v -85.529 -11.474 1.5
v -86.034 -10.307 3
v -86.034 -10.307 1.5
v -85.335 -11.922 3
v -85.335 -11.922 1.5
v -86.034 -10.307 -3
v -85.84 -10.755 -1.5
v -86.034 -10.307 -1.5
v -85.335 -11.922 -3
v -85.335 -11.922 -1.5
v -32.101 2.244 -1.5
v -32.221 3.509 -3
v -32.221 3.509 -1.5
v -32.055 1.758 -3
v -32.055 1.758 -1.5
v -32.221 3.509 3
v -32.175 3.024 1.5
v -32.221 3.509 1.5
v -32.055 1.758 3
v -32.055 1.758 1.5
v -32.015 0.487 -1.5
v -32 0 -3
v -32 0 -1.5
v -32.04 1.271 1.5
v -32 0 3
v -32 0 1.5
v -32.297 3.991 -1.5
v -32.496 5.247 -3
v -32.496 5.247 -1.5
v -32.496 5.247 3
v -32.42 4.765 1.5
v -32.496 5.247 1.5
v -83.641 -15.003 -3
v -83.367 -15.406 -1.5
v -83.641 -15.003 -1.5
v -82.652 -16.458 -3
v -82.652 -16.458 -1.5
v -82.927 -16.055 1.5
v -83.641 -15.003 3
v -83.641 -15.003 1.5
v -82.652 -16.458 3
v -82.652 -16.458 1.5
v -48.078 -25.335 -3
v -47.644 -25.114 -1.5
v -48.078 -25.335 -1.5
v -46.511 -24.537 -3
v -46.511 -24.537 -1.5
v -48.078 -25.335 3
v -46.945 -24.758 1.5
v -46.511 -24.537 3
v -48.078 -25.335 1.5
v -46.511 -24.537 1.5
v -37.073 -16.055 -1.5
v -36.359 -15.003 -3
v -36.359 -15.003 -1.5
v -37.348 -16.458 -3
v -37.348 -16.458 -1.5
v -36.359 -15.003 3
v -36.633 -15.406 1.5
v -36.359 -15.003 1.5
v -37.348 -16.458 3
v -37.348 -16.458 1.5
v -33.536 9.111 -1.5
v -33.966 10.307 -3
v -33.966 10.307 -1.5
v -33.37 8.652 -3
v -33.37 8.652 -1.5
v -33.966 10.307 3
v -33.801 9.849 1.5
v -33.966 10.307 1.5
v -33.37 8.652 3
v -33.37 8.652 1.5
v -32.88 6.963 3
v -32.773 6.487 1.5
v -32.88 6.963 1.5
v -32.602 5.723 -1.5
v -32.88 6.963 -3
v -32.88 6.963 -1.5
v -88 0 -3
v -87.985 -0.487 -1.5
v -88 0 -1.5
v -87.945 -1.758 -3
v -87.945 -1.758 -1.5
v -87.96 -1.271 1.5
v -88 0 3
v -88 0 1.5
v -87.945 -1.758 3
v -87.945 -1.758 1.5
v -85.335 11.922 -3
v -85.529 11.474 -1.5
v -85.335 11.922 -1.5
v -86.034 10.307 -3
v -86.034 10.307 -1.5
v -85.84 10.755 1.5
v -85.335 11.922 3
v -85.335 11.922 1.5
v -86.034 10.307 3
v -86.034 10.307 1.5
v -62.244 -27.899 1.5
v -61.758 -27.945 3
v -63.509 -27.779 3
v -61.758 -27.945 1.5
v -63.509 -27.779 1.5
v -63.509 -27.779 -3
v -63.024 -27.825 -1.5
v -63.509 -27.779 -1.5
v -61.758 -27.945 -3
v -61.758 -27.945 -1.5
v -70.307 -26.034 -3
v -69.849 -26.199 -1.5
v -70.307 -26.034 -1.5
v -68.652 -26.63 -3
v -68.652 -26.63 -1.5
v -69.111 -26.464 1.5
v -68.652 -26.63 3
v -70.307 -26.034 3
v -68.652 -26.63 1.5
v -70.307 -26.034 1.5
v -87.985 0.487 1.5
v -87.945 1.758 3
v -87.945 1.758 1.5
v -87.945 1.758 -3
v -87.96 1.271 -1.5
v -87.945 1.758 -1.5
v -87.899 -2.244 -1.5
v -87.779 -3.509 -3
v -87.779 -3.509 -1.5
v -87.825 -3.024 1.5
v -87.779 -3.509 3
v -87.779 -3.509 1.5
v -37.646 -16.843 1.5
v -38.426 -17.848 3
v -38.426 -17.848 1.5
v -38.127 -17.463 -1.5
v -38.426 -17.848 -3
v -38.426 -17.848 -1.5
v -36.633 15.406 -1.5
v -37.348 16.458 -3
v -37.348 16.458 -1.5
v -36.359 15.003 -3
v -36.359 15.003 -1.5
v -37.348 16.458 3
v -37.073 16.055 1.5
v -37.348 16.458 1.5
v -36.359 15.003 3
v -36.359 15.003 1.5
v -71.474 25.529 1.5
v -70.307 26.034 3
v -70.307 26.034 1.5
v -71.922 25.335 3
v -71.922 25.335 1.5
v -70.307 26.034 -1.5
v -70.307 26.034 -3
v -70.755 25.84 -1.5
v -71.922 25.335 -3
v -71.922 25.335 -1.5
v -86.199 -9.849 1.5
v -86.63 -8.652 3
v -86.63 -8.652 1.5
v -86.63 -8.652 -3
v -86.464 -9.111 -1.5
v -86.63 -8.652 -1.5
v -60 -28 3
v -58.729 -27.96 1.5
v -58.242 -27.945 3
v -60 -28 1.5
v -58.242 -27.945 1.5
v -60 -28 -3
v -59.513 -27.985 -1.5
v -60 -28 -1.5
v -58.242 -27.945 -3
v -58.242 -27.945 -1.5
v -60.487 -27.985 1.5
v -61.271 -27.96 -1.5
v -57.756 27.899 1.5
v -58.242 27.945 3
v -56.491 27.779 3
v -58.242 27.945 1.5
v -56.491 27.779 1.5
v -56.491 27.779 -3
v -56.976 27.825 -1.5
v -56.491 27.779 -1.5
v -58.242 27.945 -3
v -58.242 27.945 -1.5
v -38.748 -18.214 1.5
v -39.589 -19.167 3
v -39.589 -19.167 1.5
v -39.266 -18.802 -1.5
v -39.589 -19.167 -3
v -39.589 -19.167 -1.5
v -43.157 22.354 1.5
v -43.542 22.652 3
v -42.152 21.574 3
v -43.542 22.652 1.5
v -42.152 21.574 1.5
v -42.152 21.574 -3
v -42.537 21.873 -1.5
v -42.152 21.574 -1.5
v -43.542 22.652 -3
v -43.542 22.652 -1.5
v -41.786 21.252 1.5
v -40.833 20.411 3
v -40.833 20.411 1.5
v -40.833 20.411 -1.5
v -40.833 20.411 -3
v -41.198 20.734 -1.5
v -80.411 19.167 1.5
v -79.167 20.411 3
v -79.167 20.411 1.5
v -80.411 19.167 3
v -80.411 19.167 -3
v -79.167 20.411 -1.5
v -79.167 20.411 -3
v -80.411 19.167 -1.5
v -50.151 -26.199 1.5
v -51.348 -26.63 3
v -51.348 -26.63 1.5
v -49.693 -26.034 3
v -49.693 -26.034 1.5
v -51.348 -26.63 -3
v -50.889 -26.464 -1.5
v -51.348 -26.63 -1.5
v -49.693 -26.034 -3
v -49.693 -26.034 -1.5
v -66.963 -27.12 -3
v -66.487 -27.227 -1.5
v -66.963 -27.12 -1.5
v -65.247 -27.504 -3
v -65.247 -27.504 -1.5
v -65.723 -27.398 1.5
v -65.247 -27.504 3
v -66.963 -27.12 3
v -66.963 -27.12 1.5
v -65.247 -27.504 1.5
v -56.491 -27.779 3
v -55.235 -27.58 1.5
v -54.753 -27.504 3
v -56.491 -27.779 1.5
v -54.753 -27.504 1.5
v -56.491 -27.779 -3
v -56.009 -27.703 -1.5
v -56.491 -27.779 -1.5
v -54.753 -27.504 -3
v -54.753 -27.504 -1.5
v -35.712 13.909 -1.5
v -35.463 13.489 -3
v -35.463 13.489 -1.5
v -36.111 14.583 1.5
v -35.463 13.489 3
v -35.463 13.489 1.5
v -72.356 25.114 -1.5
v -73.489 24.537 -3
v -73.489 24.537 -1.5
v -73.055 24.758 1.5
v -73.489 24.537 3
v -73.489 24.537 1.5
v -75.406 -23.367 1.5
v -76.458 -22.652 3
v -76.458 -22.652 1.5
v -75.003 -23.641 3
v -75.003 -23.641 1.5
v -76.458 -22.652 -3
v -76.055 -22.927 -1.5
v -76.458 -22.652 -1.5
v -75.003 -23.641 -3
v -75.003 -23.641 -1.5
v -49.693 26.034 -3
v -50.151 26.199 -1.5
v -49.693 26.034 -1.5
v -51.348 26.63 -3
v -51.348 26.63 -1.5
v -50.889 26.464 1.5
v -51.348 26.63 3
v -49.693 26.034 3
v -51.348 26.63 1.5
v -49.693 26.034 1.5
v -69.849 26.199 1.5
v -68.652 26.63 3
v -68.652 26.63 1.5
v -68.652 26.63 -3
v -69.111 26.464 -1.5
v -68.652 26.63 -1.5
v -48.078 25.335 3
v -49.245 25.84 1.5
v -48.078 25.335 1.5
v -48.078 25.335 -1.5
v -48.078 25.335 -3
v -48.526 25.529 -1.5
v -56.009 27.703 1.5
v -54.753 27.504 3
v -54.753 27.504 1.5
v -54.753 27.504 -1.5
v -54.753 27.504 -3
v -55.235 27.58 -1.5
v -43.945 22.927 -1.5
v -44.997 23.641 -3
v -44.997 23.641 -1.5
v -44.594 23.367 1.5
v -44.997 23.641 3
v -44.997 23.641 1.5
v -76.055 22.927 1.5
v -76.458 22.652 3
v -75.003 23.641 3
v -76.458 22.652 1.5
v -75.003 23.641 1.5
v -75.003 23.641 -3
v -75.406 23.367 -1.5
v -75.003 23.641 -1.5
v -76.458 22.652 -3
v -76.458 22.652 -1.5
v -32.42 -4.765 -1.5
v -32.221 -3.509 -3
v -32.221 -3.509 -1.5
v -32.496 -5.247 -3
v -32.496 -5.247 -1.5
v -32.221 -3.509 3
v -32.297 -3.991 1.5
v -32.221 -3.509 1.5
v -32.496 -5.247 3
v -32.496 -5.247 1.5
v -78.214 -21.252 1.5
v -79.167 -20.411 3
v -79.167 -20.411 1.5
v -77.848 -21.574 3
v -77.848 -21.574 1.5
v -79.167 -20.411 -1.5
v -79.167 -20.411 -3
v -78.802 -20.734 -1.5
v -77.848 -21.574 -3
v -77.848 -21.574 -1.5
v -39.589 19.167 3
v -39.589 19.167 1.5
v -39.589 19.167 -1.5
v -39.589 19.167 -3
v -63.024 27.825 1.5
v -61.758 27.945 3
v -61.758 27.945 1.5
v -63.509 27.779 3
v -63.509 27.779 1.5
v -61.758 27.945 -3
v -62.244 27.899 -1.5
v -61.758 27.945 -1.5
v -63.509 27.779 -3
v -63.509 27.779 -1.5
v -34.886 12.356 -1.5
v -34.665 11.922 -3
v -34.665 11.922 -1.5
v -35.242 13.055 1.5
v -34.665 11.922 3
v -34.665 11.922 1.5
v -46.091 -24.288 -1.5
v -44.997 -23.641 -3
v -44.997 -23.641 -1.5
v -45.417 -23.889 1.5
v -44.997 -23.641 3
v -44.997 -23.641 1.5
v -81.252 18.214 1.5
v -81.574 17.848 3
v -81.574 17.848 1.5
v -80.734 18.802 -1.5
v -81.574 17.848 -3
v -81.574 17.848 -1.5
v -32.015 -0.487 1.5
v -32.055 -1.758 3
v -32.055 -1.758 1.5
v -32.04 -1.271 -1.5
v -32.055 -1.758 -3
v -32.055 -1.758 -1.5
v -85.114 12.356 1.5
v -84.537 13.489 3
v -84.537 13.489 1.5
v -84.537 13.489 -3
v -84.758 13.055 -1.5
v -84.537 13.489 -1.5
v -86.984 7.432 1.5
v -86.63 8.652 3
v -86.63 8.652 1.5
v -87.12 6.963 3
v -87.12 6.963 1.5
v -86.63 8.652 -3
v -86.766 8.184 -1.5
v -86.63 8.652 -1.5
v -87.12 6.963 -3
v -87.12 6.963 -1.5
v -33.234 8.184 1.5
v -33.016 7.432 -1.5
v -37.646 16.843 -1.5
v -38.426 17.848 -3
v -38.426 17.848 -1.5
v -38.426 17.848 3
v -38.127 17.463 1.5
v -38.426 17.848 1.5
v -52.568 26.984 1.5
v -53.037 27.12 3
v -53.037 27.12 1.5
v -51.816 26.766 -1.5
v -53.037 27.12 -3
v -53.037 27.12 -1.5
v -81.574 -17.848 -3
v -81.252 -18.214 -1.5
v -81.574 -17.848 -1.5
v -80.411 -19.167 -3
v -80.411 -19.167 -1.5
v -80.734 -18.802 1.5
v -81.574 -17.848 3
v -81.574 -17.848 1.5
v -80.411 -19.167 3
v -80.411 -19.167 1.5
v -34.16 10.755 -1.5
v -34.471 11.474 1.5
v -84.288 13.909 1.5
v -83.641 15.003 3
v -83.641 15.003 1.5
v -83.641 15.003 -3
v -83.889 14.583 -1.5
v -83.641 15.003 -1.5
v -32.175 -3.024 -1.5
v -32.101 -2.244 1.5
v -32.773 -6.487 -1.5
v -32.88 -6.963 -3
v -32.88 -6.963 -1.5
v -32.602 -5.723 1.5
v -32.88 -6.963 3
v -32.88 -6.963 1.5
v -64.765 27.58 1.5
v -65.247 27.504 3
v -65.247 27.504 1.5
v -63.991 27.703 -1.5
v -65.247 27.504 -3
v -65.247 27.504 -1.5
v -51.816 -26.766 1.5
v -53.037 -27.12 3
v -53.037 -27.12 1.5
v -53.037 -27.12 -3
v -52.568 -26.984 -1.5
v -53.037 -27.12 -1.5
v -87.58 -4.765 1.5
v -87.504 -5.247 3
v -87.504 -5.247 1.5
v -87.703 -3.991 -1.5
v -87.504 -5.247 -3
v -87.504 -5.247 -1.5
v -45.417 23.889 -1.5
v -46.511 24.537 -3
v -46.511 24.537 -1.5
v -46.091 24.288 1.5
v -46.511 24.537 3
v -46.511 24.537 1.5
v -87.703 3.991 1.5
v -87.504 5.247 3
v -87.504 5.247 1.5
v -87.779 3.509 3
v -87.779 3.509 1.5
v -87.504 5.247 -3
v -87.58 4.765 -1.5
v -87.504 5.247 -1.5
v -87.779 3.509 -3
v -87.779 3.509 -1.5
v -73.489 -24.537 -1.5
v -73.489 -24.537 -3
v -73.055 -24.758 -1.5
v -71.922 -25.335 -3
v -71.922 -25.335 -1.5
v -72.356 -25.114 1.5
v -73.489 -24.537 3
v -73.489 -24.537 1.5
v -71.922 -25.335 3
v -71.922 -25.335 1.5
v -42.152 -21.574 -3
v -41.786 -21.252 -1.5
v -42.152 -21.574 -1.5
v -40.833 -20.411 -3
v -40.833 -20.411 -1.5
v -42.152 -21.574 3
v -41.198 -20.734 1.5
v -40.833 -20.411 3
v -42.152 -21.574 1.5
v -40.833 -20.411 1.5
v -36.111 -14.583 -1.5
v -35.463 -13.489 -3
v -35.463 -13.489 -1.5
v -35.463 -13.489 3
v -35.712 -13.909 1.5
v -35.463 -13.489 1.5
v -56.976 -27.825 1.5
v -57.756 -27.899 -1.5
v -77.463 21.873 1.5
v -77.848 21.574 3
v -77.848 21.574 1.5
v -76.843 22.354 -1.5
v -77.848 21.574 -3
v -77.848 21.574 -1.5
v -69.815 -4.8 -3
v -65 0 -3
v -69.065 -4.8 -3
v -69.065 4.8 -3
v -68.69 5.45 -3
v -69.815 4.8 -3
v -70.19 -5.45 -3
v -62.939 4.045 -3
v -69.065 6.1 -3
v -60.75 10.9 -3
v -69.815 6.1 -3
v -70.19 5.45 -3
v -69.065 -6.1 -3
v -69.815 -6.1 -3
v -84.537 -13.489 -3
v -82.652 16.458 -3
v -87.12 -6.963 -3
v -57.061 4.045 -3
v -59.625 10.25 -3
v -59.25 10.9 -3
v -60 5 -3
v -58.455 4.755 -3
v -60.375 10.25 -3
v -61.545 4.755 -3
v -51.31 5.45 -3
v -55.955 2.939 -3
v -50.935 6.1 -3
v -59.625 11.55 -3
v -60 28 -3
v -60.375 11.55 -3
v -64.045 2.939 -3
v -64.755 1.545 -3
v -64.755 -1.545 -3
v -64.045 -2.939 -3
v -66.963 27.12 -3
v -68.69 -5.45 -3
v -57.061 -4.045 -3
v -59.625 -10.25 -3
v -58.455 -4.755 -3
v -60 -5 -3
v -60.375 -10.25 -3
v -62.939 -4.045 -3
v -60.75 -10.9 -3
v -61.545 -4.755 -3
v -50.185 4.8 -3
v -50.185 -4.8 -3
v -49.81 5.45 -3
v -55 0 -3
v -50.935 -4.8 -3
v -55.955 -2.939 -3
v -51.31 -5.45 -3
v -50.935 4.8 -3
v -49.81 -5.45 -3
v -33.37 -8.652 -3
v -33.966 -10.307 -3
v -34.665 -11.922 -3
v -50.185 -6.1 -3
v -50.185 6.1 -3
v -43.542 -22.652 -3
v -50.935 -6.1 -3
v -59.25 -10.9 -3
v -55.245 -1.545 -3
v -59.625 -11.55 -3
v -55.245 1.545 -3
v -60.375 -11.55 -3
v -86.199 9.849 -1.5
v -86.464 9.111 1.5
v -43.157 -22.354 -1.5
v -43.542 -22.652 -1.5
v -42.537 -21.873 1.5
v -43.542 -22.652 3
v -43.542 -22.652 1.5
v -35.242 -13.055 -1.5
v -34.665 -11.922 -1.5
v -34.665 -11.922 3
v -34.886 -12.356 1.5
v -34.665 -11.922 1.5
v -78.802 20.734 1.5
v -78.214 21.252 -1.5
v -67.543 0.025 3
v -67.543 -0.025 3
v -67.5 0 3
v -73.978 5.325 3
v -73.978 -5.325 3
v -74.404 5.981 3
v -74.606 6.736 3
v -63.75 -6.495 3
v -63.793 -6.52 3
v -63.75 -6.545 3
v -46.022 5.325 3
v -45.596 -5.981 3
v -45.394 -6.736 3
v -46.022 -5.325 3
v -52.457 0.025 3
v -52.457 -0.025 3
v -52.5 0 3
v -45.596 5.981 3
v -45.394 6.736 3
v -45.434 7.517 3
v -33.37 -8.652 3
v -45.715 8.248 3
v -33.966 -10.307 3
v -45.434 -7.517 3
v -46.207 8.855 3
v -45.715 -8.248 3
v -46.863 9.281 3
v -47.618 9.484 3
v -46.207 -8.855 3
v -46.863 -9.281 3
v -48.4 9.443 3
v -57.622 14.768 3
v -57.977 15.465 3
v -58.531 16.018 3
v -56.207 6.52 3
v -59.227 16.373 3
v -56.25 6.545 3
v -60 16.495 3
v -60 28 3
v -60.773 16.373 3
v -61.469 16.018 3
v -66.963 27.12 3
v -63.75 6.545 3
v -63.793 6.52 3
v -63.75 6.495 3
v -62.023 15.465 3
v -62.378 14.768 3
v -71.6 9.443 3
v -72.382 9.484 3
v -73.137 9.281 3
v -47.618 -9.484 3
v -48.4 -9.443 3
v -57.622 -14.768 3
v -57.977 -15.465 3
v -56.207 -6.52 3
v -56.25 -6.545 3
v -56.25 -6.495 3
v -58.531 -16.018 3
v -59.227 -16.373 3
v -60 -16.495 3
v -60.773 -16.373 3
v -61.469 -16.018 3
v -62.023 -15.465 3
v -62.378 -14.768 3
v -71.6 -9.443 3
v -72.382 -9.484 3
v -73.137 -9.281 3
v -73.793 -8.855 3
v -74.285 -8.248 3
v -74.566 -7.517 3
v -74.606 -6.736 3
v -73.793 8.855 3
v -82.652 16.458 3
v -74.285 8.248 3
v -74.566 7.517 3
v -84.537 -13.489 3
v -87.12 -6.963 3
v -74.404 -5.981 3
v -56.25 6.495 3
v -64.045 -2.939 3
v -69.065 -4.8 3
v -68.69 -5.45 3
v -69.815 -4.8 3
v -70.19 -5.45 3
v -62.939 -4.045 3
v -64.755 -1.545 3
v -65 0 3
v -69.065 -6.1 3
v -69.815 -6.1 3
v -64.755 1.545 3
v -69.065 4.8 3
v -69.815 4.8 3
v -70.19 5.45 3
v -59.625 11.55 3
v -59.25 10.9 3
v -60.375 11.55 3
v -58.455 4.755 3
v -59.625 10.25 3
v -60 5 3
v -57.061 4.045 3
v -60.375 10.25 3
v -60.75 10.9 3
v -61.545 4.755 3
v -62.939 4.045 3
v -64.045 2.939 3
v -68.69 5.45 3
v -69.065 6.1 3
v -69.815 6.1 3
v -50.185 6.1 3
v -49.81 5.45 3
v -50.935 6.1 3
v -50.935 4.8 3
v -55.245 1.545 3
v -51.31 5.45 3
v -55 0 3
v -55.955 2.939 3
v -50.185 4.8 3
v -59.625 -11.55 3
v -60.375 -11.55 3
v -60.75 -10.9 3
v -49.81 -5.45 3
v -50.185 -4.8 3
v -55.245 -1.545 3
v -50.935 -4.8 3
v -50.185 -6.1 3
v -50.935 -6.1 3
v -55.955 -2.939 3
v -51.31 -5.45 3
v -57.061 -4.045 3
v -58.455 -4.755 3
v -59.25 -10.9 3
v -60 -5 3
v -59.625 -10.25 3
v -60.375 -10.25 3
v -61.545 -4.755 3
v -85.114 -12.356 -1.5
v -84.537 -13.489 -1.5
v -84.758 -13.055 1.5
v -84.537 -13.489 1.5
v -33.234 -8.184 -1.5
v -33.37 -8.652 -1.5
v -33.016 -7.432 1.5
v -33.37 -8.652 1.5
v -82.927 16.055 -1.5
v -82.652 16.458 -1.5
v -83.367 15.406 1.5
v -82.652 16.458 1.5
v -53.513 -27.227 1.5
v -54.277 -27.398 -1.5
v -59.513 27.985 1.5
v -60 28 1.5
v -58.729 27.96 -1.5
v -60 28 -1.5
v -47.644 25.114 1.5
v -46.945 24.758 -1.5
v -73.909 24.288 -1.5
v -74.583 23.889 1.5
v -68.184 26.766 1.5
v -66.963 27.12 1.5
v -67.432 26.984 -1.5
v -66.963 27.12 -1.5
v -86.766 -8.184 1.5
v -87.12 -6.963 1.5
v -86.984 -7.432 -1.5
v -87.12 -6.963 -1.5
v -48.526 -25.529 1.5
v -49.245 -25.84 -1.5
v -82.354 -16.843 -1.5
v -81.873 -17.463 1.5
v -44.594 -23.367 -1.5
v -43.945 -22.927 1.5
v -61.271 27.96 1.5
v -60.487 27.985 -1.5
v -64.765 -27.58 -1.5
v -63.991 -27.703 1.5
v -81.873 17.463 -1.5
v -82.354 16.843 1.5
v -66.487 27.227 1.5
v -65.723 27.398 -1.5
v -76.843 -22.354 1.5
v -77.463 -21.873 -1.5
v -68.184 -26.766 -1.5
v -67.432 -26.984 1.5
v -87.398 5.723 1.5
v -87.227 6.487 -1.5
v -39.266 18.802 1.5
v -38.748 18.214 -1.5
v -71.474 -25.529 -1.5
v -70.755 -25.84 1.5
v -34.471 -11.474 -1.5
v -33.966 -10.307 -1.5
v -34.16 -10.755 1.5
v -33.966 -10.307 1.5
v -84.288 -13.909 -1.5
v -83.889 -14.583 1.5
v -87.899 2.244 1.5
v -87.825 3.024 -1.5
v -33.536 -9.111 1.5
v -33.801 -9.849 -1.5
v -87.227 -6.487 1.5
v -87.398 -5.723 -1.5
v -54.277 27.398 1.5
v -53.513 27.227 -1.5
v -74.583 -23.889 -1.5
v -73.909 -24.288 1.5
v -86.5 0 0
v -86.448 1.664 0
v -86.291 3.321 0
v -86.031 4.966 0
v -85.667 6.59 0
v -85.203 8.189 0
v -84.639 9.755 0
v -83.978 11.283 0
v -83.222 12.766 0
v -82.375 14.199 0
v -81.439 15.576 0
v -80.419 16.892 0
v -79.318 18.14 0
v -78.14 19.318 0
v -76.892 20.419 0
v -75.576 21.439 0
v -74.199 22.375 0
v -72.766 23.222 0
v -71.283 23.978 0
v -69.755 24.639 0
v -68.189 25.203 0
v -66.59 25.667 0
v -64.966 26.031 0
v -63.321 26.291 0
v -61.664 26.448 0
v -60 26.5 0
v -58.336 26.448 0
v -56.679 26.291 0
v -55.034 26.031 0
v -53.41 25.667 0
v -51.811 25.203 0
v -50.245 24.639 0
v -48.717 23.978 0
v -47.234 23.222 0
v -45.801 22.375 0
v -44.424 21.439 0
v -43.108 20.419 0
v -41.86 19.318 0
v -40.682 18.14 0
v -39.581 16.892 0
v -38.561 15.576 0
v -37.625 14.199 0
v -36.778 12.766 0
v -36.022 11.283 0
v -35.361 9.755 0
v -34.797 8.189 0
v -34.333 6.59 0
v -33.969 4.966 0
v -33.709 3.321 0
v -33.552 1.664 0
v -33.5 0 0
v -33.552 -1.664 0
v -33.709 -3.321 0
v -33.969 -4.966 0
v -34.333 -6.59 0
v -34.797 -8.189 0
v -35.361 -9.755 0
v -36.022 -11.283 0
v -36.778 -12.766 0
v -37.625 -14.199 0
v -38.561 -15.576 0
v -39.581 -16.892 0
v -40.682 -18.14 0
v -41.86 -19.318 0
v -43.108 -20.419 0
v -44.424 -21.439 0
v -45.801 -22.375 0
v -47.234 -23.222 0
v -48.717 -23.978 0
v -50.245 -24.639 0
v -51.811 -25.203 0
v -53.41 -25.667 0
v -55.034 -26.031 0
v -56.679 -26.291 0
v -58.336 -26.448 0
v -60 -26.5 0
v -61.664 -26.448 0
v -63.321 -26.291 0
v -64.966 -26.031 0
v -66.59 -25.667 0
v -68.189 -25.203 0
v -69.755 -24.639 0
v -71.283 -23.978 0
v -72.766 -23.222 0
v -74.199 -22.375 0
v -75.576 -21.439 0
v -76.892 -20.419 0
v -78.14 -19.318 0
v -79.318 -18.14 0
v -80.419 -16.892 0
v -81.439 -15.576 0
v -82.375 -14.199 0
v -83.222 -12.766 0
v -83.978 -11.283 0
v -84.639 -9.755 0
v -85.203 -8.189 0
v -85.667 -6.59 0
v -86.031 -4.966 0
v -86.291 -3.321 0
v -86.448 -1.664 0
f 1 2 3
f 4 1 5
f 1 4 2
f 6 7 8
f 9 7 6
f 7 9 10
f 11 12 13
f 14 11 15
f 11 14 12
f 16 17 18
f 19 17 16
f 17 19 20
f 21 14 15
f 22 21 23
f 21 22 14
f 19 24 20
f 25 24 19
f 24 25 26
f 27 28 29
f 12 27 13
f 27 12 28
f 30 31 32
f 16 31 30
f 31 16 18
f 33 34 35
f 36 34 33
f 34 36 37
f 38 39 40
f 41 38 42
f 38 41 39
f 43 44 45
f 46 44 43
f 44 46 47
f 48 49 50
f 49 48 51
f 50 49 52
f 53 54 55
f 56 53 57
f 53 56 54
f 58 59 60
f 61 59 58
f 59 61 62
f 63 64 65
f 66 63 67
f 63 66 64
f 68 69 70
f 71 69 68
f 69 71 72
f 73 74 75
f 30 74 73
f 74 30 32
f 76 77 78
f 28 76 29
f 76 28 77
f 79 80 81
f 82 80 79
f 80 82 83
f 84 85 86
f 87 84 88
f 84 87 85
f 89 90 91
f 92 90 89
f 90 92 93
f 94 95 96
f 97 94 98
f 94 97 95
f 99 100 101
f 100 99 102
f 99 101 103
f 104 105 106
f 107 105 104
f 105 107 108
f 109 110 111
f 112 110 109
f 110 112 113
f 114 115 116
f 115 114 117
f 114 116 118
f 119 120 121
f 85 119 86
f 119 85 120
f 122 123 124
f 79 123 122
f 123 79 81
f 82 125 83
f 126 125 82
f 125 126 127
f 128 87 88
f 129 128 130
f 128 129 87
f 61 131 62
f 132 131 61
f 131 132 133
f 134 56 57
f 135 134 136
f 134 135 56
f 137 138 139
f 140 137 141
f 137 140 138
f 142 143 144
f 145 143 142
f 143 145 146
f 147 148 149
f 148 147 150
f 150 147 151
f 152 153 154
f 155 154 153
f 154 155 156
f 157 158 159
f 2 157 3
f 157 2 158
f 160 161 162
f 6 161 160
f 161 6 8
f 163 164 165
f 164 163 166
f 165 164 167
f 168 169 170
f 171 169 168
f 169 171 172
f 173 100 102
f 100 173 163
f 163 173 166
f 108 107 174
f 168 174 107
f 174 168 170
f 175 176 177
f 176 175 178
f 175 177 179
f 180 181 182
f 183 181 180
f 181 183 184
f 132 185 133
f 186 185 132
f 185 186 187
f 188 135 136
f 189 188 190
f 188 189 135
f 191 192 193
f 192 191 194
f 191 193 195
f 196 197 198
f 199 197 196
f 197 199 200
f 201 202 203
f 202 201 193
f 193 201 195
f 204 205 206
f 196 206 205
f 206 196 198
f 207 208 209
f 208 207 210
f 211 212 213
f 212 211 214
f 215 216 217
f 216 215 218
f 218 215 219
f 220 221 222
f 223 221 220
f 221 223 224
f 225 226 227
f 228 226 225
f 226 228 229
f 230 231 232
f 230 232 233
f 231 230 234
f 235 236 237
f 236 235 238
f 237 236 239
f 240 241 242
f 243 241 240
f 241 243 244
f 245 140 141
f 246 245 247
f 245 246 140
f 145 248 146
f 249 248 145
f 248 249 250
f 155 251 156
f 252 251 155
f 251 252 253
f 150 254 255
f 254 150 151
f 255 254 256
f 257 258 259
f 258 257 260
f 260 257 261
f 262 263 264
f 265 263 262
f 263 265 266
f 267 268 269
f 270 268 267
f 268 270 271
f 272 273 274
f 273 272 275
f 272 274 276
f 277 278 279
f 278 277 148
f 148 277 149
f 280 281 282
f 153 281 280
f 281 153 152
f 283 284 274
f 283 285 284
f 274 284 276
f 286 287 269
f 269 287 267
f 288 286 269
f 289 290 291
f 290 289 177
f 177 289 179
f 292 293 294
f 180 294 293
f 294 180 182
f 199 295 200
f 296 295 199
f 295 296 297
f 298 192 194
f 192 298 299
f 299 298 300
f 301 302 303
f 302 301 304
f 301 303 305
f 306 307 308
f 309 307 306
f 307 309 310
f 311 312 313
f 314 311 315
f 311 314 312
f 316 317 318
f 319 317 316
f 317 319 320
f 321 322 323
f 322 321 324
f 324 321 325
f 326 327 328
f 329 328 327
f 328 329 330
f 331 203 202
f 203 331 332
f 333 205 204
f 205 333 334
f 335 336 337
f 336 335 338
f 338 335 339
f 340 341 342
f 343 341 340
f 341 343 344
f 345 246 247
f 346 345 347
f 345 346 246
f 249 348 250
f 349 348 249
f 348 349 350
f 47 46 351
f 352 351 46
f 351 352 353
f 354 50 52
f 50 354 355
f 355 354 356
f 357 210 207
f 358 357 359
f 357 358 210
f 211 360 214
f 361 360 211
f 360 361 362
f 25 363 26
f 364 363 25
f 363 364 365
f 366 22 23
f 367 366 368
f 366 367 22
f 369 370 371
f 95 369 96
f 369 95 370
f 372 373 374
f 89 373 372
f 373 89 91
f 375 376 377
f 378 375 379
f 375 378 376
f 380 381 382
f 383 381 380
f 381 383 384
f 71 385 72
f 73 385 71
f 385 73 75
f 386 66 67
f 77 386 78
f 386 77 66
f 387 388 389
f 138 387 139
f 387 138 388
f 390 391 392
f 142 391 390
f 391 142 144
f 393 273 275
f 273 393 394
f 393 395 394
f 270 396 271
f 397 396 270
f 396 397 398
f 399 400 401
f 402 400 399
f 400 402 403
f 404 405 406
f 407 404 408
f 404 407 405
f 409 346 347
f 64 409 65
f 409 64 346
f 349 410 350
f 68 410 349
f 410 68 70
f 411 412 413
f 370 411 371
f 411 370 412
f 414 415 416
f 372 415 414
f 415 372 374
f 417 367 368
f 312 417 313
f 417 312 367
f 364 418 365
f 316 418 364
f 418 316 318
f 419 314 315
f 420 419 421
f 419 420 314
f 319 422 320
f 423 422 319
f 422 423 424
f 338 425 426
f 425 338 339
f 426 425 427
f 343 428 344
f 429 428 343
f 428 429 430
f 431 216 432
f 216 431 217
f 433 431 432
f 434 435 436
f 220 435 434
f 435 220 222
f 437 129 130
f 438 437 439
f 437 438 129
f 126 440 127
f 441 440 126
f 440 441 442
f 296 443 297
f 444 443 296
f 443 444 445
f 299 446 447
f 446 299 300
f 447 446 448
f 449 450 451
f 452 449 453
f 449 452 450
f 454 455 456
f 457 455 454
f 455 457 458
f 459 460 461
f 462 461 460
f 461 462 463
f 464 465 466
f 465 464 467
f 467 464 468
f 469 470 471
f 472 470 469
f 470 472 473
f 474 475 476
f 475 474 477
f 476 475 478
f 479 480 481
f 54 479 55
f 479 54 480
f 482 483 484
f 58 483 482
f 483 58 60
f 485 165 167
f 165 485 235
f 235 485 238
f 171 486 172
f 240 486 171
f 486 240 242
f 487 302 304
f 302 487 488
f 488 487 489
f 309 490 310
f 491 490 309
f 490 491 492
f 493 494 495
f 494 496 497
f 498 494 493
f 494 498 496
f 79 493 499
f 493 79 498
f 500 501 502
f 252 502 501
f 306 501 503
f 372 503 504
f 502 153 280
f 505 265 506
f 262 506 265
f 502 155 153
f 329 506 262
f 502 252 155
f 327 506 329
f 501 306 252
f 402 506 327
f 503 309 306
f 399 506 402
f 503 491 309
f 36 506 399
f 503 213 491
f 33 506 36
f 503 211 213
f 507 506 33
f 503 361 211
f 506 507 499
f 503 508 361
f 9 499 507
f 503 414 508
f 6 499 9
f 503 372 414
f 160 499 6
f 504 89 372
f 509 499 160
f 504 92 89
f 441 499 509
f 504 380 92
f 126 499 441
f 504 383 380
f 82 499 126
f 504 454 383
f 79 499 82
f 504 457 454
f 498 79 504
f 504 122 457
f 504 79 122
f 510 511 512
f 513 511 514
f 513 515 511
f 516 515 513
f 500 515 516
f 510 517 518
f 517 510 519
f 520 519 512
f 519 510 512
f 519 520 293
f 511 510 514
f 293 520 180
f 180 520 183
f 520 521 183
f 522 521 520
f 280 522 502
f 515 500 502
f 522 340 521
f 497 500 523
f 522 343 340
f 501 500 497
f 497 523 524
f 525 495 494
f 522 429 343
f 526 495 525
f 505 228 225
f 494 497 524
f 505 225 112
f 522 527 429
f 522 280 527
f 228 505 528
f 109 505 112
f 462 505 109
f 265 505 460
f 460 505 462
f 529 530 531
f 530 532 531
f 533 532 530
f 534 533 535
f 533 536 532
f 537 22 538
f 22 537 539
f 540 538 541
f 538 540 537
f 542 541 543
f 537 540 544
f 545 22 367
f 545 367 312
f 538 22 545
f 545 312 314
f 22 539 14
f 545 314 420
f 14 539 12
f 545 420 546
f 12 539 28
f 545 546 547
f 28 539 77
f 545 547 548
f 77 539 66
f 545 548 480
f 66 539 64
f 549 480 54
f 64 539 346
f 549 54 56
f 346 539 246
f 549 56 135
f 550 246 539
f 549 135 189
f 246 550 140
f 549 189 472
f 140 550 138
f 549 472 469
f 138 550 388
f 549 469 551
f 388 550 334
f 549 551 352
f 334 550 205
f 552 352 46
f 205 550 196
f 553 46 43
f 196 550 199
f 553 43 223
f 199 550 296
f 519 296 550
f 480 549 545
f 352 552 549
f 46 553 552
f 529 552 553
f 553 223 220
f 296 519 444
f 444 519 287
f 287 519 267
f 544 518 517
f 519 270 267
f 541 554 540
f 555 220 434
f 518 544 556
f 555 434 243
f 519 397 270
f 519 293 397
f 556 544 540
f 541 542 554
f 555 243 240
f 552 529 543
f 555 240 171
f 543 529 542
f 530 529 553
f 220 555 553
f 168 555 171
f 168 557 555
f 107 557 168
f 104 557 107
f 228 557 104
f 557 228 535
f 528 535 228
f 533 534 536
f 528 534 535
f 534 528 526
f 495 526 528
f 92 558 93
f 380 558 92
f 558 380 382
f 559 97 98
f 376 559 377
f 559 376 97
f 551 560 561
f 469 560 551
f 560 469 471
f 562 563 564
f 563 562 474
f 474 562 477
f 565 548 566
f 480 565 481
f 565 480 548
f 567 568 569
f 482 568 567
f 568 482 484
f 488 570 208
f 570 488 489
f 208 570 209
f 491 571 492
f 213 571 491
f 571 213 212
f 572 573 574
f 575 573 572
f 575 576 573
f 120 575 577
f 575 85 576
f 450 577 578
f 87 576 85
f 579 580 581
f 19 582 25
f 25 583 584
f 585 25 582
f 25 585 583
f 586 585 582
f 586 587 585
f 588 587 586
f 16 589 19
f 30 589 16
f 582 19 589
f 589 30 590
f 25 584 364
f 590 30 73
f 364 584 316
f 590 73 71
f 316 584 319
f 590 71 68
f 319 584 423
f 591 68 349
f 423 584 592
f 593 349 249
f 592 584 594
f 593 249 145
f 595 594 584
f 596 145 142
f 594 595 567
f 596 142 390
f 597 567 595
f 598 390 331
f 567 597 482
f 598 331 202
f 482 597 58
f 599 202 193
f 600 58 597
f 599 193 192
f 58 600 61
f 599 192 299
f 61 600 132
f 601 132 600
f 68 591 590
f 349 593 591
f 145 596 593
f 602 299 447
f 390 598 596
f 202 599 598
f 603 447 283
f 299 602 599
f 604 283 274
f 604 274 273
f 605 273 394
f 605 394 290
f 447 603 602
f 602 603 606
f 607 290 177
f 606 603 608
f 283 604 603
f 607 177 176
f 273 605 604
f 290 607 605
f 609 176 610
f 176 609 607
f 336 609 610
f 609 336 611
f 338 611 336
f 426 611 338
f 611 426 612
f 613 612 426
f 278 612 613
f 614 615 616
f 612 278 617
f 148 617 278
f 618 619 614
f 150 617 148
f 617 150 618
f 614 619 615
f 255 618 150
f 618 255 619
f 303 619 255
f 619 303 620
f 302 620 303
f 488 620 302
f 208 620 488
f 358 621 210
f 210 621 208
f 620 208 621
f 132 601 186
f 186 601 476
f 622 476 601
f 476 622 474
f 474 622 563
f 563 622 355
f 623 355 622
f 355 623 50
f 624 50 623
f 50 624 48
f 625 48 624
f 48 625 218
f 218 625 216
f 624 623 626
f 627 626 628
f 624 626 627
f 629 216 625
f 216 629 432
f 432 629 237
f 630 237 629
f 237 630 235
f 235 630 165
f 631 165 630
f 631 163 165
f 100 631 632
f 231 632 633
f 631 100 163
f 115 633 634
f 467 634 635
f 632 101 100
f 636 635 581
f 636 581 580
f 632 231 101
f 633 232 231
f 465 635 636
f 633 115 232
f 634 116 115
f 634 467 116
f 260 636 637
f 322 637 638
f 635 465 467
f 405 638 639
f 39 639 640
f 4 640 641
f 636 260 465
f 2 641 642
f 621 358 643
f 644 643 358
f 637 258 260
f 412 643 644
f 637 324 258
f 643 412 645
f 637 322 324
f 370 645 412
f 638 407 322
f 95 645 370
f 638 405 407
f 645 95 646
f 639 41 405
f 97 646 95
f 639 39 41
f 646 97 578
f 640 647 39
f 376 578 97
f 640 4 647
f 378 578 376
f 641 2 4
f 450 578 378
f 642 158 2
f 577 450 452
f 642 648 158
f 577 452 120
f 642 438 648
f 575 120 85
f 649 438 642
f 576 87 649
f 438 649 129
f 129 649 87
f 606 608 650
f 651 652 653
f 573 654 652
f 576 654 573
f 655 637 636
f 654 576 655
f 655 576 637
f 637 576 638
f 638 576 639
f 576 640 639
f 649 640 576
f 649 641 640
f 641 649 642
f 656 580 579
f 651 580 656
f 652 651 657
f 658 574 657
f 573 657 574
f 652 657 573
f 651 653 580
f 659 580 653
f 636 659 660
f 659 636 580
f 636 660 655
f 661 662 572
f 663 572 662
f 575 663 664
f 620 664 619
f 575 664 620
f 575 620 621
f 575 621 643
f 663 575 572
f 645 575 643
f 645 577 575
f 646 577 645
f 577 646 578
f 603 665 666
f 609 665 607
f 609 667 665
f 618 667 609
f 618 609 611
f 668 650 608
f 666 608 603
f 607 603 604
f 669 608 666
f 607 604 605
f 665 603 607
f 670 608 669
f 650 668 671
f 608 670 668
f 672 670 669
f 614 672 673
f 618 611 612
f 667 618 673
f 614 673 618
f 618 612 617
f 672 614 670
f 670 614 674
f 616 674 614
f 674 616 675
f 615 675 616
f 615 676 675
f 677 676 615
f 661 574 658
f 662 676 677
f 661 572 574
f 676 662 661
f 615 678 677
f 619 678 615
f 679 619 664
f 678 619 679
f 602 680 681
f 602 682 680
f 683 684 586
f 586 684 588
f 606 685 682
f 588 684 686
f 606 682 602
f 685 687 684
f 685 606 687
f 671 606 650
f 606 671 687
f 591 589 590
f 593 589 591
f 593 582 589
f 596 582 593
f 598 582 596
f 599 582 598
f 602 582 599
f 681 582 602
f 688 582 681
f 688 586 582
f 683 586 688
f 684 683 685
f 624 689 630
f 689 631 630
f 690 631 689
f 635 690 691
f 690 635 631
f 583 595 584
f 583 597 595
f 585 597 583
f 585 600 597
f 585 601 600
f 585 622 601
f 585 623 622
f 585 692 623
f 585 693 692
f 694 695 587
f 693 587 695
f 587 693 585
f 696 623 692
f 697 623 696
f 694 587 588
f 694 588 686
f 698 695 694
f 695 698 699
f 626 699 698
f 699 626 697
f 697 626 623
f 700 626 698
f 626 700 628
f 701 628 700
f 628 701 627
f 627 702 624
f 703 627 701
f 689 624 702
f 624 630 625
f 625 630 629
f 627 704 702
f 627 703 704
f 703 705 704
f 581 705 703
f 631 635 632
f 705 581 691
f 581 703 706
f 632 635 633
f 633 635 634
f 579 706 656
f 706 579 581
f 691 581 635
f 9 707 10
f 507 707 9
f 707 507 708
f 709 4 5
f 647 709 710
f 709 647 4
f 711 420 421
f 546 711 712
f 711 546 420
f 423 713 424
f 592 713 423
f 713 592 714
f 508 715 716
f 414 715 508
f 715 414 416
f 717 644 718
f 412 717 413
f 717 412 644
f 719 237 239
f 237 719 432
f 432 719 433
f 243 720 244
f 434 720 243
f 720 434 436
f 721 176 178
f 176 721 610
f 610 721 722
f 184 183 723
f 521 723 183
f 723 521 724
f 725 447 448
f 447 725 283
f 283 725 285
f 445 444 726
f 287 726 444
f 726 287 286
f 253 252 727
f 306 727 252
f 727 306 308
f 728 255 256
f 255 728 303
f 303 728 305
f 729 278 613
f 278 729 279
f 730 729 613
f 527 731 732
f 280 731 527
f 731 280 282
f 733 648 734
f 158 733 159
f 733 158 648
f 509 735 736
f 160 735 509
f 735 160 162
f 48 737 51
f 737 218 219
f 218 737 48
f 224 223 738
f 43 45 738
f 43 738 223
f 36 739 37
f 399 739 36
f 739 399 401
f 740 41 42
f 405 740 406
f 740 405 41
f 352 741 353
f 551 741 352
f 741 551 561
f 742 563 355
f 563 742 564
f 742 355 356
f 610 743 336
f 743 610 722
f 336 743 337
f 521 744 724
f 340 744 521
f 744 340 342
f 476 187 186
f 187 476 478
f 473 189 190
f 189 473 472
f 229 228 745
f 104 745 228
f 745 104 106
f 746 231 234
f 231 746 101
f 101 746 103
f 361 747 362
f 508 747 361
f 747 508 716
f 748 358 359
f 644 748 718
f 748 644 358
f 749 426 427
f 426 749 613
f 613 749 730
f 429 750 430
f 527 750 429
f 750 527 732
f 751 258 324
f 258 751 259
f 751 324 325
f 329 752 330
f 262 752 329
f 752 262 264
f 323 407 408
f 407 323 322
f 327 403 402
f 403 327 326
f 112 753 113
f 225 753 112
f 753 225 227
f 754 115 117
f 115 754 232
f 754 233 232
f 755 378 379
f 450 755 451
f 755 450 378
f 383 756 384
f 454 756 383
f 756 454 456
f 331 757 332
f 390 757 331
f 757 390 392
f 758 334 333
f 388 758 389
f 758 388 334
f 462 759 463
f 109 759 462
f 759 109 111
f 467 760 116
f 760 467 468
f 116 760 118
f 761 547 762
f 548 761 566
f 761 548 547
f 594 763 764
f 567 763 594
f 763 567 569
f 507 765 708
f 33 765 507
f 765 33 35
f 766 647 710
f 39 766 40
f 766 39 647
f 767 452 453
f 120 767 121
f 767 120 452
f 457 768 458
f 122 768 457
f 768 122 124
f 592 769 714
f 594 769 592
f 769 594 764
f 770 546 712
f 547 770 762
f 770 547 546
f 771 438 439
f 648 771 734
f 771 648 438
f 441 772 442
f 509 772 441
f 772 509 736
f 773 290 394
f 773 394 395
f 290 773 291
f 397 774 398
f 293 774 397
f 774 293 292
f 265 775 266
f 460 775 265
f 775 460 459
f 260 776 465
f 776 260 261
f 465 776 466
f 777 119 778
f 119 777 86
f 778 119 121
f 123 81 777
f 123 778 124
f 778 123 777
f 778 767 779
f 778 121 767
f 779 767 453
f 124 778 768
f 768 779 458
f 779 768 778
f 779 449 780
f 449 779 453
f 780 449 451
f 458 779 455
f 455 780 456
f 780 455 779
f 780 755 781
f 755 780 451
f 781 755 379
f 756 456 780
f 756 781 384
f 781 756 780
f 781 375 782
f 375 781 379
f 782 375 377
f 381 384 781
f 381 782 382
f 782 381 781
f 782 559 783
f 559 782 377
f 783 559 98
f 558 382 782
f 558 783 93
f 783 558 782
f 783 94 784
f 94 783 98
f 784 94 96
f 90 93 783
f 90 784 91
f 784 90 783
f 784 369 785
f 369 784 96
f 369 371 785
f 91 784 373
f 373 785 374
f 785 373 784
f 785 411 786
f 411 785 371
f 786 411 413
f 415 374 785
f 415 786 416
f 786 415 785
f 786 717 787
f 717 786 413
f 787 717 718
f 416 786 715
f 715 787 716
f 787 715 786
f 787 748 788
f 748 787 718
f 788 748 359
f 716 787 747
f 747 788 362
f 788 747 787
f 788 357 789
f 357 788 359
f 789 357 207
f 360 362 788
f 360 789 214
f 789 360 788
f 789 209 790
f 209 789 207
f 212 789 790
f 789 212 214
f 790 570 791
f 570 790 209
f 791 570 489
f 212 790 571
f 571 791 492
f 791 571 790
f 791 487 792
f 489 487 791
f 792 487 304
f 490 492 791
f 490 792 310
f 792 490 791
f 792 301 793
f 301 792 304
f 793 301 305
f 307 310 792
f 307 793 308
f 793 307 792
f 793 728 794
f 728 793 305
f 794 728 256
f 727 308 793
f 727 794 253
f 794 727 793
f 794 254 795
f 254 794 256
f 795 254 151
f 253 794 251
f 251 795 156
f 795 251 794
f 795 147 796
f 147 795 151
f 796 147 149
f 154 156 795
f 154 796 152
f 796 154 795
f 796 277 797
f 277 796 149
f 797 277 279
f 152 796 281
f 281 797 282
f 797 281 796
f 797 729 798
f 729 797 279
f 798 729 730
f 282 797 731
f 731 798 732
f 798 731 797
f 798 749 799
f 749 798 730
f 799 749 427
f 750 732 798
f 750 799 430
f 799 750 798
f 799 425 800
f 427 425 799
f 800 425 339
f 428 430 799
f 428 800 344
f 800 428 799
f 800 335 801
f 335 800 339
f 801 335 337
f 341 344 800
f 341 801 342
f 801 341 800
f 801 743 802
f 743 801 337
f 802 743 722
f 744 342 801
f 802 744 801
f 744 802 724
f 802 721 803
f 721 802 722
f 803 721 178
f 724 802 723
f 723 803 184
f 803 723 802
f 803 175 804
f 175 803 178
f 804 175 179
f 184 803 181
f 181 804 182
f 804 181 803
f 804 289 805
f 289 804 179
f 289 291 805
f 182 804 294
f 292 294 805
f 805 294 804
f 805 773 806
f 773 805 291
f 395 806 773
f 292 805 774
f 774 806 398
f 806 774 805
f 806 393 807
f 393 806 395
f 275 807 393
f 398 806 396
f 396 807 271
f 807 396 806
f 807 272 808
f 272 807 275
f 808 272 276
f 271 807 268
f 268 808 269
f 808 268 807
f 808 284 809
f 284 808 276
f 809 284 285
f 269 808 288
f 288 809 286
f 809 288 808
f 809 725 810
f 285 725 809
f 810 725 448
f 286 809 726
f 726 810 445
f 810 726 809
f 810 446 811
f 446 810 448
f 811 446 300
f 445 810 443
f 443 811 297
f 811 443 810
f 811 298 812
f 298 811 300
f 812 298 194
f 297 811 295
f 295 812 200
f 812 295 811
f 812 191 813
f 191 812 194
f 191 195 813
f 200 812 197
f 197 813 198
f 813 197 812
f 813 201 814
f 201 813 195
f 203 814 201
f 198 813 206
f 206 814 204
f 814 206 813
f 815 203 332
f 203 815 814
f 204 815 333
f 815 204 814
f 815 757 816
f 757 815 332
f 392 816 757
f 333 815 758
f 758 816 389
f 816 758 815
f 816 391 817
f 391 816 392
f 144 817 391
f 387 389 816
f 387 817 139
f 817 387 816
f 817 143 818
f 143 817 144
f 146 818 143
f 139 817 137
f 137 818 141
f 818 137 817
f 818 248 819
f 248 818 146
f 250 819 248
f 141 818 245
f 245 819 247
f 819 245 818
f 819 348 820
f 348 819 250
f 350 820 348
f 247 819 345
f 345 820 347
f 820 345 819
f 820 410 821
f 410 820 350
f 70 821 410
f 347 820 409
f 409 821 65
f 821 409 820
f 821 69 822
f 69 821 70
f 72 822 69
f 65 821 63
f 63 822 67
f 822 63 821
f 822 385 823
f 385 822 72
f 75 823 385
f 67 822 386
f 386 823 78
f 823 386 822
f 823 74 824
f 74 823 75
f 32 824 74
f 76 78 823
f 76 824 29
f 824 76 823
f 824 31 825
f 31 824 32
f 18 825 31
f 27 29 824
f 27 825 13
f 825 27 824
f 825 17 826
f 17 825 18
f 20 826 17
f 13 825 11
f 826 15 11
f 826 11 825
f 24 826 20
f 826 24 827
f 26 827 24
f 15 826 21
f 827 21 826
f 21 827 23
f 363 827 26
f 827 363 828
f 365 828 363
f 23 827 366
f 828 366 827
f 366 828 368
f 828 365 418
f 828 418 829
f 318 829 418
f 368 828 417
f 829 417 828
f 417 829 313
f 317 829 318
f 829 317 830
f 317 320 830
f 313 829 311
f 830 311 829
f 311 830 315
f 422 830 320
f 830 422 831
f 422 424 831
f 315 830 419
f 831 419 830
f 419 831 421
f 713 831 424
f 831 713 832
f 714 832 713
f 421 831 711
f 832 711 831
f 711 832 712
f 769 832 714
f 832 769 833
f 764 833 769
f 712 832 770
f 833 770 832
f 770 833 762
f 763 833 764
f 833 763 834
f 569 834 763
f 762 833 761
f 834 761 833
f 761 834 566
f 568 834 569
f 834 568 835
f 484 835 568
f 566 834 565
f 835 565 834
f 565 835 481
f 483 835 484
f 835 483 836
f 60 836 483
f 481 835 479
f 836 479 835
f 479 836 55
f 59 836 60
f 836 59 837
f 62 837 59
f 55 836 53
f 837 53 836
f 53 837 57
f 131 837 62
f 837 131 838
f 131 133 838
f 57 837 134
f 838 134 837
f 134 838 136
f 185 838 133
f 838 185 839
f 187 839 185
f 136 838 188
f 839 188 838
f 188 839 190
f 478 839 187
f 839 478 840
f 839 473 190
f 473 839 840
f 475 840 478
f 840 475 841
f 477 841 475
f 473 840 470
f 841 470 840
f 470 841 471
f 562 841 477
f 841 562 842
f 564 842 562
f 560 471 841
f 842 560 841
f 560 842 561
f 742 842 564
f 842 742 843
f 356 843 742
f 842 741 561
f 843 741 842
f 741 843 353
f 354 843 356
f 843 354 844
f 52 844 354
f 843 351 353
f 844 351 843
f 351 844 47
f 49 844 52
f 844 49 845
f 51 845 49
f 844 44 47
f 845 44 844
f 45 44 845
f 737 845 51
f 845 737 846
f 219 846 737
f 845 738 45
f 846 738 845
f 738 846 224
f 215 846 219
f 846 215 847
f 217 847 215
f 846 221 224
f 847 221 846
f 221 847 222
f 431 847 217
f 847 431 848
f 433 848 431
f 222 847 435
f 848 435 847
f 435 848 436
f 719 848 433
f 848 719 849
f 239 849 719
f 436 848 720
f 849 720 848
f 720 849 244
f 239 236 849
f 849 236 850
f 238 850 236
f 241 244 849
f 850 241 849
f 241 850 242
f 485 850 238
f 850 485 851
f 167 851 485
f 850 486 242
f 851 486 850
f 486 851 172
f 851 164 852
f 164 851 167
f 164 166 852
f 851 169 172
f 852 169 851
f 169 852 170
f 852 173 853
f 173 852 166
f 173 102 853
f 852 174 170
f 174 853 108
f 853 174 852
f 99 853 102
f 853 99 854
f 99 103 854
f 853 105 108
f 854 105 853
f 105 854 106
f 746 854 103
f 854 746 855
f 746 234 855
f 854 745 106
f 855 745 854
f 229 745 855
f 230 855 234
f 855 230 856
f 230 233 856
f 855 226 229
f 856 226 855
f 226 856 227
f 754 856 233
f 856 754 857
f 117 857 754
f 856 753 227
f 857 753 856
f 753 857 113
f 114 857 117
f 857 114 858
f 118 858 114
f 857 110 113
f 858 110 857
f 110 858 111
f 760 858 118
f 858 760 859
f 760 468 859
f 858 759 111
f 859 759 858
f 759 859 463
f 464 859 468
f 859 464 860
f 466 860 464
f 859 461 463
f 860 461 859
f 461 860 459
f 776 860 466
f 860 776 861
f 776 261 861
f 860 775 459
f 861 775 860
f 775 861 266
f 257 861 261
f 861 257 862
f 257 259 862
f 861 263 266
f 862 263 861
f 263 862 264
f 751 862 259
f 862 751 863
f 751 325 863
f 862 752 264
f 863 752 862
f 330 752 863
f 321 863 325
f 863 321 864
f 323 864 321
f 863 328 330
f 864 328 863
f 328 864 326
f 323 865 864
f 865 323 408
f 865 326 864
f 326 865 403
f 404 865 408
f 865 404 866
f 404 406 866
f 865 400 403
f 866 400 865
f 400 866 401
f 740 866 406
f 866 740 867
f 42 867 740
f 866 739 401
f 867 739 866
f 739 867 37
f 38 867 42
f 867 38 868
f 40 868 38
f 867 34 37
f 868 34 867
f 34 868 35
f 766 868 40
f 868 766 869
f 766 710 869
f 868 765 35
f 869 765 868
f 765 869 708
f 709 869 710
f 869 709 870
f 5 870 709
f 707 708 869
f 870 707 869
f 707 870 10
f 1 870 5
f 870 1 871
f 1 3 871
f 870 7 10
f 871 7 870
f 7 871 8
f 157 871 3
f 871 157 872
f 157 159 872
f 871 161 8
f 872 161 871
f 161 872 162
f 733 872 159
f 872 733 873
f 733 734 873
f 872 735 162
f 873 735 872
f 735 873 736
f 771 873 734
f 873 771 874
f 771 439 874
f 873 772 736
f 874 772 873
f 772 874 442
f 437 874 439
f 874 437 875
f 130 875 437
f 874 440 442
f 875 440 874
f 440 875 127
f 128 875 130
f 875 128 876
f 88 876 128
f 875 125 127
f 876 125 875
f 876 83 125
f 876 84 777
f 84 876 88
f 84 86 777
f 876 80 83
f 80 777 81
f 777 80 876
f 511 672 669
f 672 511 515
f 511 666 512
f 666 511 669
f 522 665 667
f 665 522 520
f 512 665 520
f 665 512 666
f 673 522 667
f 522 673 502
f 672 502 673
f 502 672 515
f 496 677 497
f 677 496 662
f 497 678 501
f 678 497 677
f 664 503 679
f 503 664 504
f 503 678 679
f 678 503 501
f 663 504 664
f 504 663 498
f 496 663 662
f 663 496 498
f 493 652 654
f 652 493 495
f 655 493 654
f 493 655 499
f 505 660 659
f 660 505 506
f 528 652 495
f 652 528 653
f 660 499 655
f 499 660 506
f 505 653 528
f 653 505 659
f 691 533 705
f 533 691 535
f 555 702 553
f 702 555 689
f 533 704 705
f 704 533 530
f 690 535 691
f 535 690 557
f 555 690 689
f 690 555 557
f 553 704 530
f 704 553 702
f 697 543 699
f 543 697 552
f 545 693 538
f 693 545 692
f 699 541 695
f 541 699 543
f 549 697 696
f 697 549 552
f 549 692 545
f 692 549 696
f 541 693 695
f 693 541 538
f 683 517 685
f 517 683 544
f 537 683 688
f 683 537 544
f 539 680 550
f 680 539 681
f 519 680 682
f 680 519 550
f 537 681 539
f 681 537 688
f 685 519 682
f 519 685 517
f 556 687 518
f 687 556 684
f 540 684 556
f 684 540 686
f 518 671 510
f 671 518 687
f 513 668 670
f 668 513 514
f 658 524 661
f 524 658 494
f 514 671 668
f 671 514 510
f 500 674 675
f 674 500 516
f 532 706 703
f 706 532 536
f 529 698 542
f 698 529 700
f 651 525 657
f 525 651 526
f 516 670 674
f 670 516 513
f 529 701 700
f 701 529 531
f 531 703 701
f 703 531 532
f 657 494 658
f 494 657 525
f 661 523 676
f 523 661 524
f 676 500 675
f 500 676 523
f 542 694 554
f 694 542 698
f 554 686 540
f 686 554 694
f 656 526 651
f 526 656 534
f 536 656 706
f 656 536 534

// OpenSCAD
//-------------------------------------------------------------
//-- Servo wheel
//-- (c) Juan Gonzalez (obijuan) juan@iearobotics.com
//-- March-2012
//-------------------------------------------------------------
//-- Wheel for mobile robots, drived by Futaba 3003 servos
//-------------------------------------------------------------

//-- Wheel parameters
wheel_or_idiam = 50;                   //-- O-ring inner diameter
wheel_or_diam = 3;                     //-- O-ring section diameter
wheel_height = 2*wheel_or_diam+0;     //-- Wheel height: change the 0 for 
                                      //-- other value (0 equals minimun height)
//-- Parameters common to all horns
horn_drill_diam = 1.5;
horn_height = 8;        //-- Total height: shaft + plate
horn_plate_height = 2;  //-- plate height

//-- Futaba 3003 servo rounded horn parameters
rh_diam1 = 8.5;  //-- Rounded horn small diameter
rh_diam2 = 21.5; //-- Rounded horn big diameter
rounded_horn_drill_distance = 7.3;

//-- Futaba 3003 horn drills


//-- Futaba 3003 4-arm horn parameters
a4h_end_diam = 5;
a4h_center_diam = 10;
a4h_arm_length = 15;
a4h_drill_distance = 13.3;


//-- Futaba 3003 6-arm horn parameters
a6h_end_diam = 5;
a6h_center_diam = 10;
a6h_arm_length=10;
a6h_arm_base_diam=7.5;
a6h_drill_distance = 10.9;


//-------------------------------------------------------
//--- Parameters:
//-- or_idiam: O-ring inner diameter
//-- or_diam: O-ring section diameter
//-- h: Height of the wheel
//--
//--  Module for generating a raw wheel, with no drills
//--  and no servo horn
//-------------------------------------------------------
module raw_wheel(or_idiam=50, or_diam=3, h=6)
{
   //-- Wheel parameters
   r = or_idiam/2 + or_diam;   //-- Radius

  //-- Temporal points
  l = or_diam*sqrt(2)/2;

  difference() {
    //-- Body of the wheel
    cylinder (r=r, h=h, $fn=100,center=true);

    //--  wheel's inner section
    rotate_extrude($fn=100)
      translate([r-or_diam/2,0,0])
      polygon( [ [0,0],[l,l],[l,-l] ] , [ [0,1,2] ]);
  }
}

//--------------------------------------------------------------
//-- Generic module for the horn's drills
//-- Parameters:
//--  d = drill's radial distance (from the horn's center)
//--  n = number of drills
//--  h = wheel height
//--------------------------------------------------------------
module horn_drills(d,n,h)
{
  union() {
    for ( i = [0 : n-1] ) {
        rotate([0,0,i*360/n])
        translate([0,d,0])
        cylinder(r=horn_drill_diam/2, h=h+10,center=true, $fn=6);  
      }
  }
}

//-----------------------------------------
//-- Futaba 3003 horn4 arm
//-- This module is just one arm
//-----------------------------------------
module horn4_arm(h=5)
{
  translate([0,a4h_arm_length-a4h_end_diam/2,0])
  //-- The arm consist of the perimeter of a cylinder and a cube
  hull() {
    cylinder(r=a4h_end_diam/2, h=h, center=true, $fn=20);
    translate([0,1-a4h_arm_length+a4h_end_diam/2,0])
      cube([a4h_center_diam,2,h],center=true);
  }
}

//-----------------------------------------
//-- Futaba 3003 horn6 arm
//-- This module is just one arm
//-----------------------------------------
module horn6_arm(h=5)
{
  translate([0,a6h_arm_length-a6h_end_diam/2,0])
  //-- The arm consist of the perimeter of a cylinder and a cube
  hull() {
    cylinder(r=a6h_end_diam/2, h=h, center=true, $fn=20);
    translate([0,-a6h_arm_length+a6h_end_diam/2,0])
    cube([a6h_arm_base_diam,0.1,h],center=true);
  }
}


//-------------------------------------------
//-- Futaba 3003 4-arm horn
//-------------------------------------------
module horn4(h=5)
{
  union() {
    //-- Center part (is a square)
    cube([a4h_center_diam+0.2,a4h_center_diam+0.2,h],center=true);

    //-- Place the 4 arms in every side of the cube
    for ( i = [0 : 3] ) {
      rotate( [0,0,i*90])
      translate([0, a4h_center_diam/2, 0])
      horn4_arm(h);
    }
  }

}

//-------------------------------------------
//-- Futaba 3003 6-arm horn
//-------------------------------------------
module horn6(h=5)
{
  union() {
    //-- The center part is a cylinder
    cylinder(r=15/2,h=h,center=true);

    //-- Place the 6 arms rotated 60 degrees
    for ( i = [0 : 5] ) {
      rotate( [0,0,i*60])
      translate([0, 15/2*cos(30), 0])
      horn6_arm(h);
    }
  }
}


//-------------------------------------------------------
//--  A Wheel for the futaba 3003 rounded horns
//--------------------------------------------------------
module Servo_wheel_rounded_horn()
{
  difference() {
      raw_wheel(or_idiam=wheel_or_idiam, or_diam=wheel_or_diam, h=wheel_height);

      //-- Inner drill
      cylinder(center=true, h=2*wheel_height + 10, r=rh_diam1/2+0.2,$fn=100);

      //-- Carved circle for the Futaba rounded horn
      translate([0,0,-wheel_height/2+horn_height-horn_plate_height]) 
       cylinder(r=rh_diam2/2+0.25, h=2*wheel_height+10,$fn=30);

      //-- small drills for the rounded horn
      horn_drills(d=rounded_horn_drill_distance, n=4, h=wheel_height);
  }

}

//-------------------------------------------------------
//--  A Wheel for the futaba 3003 4-arm horns
//--------------------------------------------------------
module Servo_wheel_4_arm_horn()
{
  difference() {
      raw_wheel(or_idiam=wheel_or_idiam, or_diam=wheel_or_diam, h=wheel_height);

      //-- Inner drill
      cylinder(center=true, h=2*wheel_height + 10, r=a4h_center_diam/2,$fn=20);

      //-- substract the 4-arm servo horn
      translate([0,0,horn_height-horn_plate_height])
        horn4(h=wheel_height);

      //-- Horn drills
      horn_drills(d=a4h_drill_distance, n=4, h=wheel_height);

  }
}

//-------------------------------------------------------
//--  A Wheel for the futaba 3003 6-arm horns
//--------------------------------------------------------
module Servo_wheel_6_arm_horn()
{
  difference() {
      raw_wheel(or_idiam=wheel_or_idiam, or_diam=wheel_or_diam, h=wheel_height);

       //-- Inner drill
      cylinder(center=true, h=2*wheel_height + 10, r=a6h_center_diam/2,$fn=20);

      //-- substract the 6-arm horn
      translate([0,0,horn_height-horn_plate_height])
      horn6(h=wheel_height);

      //-- Horn drills
      horn_drills(d=a6h_drill_distance, n=6, h=wheel_height);
  }
}


//-- Test!
//Servo_wheel_rounded_horn();
//translate([wheel_or_idiam+10,0,0]) Servo_wheel_4_arm_horn();
translate([-wheel_or_idiam-10,0,0]) Servo_wheel_6_arm_horn();
